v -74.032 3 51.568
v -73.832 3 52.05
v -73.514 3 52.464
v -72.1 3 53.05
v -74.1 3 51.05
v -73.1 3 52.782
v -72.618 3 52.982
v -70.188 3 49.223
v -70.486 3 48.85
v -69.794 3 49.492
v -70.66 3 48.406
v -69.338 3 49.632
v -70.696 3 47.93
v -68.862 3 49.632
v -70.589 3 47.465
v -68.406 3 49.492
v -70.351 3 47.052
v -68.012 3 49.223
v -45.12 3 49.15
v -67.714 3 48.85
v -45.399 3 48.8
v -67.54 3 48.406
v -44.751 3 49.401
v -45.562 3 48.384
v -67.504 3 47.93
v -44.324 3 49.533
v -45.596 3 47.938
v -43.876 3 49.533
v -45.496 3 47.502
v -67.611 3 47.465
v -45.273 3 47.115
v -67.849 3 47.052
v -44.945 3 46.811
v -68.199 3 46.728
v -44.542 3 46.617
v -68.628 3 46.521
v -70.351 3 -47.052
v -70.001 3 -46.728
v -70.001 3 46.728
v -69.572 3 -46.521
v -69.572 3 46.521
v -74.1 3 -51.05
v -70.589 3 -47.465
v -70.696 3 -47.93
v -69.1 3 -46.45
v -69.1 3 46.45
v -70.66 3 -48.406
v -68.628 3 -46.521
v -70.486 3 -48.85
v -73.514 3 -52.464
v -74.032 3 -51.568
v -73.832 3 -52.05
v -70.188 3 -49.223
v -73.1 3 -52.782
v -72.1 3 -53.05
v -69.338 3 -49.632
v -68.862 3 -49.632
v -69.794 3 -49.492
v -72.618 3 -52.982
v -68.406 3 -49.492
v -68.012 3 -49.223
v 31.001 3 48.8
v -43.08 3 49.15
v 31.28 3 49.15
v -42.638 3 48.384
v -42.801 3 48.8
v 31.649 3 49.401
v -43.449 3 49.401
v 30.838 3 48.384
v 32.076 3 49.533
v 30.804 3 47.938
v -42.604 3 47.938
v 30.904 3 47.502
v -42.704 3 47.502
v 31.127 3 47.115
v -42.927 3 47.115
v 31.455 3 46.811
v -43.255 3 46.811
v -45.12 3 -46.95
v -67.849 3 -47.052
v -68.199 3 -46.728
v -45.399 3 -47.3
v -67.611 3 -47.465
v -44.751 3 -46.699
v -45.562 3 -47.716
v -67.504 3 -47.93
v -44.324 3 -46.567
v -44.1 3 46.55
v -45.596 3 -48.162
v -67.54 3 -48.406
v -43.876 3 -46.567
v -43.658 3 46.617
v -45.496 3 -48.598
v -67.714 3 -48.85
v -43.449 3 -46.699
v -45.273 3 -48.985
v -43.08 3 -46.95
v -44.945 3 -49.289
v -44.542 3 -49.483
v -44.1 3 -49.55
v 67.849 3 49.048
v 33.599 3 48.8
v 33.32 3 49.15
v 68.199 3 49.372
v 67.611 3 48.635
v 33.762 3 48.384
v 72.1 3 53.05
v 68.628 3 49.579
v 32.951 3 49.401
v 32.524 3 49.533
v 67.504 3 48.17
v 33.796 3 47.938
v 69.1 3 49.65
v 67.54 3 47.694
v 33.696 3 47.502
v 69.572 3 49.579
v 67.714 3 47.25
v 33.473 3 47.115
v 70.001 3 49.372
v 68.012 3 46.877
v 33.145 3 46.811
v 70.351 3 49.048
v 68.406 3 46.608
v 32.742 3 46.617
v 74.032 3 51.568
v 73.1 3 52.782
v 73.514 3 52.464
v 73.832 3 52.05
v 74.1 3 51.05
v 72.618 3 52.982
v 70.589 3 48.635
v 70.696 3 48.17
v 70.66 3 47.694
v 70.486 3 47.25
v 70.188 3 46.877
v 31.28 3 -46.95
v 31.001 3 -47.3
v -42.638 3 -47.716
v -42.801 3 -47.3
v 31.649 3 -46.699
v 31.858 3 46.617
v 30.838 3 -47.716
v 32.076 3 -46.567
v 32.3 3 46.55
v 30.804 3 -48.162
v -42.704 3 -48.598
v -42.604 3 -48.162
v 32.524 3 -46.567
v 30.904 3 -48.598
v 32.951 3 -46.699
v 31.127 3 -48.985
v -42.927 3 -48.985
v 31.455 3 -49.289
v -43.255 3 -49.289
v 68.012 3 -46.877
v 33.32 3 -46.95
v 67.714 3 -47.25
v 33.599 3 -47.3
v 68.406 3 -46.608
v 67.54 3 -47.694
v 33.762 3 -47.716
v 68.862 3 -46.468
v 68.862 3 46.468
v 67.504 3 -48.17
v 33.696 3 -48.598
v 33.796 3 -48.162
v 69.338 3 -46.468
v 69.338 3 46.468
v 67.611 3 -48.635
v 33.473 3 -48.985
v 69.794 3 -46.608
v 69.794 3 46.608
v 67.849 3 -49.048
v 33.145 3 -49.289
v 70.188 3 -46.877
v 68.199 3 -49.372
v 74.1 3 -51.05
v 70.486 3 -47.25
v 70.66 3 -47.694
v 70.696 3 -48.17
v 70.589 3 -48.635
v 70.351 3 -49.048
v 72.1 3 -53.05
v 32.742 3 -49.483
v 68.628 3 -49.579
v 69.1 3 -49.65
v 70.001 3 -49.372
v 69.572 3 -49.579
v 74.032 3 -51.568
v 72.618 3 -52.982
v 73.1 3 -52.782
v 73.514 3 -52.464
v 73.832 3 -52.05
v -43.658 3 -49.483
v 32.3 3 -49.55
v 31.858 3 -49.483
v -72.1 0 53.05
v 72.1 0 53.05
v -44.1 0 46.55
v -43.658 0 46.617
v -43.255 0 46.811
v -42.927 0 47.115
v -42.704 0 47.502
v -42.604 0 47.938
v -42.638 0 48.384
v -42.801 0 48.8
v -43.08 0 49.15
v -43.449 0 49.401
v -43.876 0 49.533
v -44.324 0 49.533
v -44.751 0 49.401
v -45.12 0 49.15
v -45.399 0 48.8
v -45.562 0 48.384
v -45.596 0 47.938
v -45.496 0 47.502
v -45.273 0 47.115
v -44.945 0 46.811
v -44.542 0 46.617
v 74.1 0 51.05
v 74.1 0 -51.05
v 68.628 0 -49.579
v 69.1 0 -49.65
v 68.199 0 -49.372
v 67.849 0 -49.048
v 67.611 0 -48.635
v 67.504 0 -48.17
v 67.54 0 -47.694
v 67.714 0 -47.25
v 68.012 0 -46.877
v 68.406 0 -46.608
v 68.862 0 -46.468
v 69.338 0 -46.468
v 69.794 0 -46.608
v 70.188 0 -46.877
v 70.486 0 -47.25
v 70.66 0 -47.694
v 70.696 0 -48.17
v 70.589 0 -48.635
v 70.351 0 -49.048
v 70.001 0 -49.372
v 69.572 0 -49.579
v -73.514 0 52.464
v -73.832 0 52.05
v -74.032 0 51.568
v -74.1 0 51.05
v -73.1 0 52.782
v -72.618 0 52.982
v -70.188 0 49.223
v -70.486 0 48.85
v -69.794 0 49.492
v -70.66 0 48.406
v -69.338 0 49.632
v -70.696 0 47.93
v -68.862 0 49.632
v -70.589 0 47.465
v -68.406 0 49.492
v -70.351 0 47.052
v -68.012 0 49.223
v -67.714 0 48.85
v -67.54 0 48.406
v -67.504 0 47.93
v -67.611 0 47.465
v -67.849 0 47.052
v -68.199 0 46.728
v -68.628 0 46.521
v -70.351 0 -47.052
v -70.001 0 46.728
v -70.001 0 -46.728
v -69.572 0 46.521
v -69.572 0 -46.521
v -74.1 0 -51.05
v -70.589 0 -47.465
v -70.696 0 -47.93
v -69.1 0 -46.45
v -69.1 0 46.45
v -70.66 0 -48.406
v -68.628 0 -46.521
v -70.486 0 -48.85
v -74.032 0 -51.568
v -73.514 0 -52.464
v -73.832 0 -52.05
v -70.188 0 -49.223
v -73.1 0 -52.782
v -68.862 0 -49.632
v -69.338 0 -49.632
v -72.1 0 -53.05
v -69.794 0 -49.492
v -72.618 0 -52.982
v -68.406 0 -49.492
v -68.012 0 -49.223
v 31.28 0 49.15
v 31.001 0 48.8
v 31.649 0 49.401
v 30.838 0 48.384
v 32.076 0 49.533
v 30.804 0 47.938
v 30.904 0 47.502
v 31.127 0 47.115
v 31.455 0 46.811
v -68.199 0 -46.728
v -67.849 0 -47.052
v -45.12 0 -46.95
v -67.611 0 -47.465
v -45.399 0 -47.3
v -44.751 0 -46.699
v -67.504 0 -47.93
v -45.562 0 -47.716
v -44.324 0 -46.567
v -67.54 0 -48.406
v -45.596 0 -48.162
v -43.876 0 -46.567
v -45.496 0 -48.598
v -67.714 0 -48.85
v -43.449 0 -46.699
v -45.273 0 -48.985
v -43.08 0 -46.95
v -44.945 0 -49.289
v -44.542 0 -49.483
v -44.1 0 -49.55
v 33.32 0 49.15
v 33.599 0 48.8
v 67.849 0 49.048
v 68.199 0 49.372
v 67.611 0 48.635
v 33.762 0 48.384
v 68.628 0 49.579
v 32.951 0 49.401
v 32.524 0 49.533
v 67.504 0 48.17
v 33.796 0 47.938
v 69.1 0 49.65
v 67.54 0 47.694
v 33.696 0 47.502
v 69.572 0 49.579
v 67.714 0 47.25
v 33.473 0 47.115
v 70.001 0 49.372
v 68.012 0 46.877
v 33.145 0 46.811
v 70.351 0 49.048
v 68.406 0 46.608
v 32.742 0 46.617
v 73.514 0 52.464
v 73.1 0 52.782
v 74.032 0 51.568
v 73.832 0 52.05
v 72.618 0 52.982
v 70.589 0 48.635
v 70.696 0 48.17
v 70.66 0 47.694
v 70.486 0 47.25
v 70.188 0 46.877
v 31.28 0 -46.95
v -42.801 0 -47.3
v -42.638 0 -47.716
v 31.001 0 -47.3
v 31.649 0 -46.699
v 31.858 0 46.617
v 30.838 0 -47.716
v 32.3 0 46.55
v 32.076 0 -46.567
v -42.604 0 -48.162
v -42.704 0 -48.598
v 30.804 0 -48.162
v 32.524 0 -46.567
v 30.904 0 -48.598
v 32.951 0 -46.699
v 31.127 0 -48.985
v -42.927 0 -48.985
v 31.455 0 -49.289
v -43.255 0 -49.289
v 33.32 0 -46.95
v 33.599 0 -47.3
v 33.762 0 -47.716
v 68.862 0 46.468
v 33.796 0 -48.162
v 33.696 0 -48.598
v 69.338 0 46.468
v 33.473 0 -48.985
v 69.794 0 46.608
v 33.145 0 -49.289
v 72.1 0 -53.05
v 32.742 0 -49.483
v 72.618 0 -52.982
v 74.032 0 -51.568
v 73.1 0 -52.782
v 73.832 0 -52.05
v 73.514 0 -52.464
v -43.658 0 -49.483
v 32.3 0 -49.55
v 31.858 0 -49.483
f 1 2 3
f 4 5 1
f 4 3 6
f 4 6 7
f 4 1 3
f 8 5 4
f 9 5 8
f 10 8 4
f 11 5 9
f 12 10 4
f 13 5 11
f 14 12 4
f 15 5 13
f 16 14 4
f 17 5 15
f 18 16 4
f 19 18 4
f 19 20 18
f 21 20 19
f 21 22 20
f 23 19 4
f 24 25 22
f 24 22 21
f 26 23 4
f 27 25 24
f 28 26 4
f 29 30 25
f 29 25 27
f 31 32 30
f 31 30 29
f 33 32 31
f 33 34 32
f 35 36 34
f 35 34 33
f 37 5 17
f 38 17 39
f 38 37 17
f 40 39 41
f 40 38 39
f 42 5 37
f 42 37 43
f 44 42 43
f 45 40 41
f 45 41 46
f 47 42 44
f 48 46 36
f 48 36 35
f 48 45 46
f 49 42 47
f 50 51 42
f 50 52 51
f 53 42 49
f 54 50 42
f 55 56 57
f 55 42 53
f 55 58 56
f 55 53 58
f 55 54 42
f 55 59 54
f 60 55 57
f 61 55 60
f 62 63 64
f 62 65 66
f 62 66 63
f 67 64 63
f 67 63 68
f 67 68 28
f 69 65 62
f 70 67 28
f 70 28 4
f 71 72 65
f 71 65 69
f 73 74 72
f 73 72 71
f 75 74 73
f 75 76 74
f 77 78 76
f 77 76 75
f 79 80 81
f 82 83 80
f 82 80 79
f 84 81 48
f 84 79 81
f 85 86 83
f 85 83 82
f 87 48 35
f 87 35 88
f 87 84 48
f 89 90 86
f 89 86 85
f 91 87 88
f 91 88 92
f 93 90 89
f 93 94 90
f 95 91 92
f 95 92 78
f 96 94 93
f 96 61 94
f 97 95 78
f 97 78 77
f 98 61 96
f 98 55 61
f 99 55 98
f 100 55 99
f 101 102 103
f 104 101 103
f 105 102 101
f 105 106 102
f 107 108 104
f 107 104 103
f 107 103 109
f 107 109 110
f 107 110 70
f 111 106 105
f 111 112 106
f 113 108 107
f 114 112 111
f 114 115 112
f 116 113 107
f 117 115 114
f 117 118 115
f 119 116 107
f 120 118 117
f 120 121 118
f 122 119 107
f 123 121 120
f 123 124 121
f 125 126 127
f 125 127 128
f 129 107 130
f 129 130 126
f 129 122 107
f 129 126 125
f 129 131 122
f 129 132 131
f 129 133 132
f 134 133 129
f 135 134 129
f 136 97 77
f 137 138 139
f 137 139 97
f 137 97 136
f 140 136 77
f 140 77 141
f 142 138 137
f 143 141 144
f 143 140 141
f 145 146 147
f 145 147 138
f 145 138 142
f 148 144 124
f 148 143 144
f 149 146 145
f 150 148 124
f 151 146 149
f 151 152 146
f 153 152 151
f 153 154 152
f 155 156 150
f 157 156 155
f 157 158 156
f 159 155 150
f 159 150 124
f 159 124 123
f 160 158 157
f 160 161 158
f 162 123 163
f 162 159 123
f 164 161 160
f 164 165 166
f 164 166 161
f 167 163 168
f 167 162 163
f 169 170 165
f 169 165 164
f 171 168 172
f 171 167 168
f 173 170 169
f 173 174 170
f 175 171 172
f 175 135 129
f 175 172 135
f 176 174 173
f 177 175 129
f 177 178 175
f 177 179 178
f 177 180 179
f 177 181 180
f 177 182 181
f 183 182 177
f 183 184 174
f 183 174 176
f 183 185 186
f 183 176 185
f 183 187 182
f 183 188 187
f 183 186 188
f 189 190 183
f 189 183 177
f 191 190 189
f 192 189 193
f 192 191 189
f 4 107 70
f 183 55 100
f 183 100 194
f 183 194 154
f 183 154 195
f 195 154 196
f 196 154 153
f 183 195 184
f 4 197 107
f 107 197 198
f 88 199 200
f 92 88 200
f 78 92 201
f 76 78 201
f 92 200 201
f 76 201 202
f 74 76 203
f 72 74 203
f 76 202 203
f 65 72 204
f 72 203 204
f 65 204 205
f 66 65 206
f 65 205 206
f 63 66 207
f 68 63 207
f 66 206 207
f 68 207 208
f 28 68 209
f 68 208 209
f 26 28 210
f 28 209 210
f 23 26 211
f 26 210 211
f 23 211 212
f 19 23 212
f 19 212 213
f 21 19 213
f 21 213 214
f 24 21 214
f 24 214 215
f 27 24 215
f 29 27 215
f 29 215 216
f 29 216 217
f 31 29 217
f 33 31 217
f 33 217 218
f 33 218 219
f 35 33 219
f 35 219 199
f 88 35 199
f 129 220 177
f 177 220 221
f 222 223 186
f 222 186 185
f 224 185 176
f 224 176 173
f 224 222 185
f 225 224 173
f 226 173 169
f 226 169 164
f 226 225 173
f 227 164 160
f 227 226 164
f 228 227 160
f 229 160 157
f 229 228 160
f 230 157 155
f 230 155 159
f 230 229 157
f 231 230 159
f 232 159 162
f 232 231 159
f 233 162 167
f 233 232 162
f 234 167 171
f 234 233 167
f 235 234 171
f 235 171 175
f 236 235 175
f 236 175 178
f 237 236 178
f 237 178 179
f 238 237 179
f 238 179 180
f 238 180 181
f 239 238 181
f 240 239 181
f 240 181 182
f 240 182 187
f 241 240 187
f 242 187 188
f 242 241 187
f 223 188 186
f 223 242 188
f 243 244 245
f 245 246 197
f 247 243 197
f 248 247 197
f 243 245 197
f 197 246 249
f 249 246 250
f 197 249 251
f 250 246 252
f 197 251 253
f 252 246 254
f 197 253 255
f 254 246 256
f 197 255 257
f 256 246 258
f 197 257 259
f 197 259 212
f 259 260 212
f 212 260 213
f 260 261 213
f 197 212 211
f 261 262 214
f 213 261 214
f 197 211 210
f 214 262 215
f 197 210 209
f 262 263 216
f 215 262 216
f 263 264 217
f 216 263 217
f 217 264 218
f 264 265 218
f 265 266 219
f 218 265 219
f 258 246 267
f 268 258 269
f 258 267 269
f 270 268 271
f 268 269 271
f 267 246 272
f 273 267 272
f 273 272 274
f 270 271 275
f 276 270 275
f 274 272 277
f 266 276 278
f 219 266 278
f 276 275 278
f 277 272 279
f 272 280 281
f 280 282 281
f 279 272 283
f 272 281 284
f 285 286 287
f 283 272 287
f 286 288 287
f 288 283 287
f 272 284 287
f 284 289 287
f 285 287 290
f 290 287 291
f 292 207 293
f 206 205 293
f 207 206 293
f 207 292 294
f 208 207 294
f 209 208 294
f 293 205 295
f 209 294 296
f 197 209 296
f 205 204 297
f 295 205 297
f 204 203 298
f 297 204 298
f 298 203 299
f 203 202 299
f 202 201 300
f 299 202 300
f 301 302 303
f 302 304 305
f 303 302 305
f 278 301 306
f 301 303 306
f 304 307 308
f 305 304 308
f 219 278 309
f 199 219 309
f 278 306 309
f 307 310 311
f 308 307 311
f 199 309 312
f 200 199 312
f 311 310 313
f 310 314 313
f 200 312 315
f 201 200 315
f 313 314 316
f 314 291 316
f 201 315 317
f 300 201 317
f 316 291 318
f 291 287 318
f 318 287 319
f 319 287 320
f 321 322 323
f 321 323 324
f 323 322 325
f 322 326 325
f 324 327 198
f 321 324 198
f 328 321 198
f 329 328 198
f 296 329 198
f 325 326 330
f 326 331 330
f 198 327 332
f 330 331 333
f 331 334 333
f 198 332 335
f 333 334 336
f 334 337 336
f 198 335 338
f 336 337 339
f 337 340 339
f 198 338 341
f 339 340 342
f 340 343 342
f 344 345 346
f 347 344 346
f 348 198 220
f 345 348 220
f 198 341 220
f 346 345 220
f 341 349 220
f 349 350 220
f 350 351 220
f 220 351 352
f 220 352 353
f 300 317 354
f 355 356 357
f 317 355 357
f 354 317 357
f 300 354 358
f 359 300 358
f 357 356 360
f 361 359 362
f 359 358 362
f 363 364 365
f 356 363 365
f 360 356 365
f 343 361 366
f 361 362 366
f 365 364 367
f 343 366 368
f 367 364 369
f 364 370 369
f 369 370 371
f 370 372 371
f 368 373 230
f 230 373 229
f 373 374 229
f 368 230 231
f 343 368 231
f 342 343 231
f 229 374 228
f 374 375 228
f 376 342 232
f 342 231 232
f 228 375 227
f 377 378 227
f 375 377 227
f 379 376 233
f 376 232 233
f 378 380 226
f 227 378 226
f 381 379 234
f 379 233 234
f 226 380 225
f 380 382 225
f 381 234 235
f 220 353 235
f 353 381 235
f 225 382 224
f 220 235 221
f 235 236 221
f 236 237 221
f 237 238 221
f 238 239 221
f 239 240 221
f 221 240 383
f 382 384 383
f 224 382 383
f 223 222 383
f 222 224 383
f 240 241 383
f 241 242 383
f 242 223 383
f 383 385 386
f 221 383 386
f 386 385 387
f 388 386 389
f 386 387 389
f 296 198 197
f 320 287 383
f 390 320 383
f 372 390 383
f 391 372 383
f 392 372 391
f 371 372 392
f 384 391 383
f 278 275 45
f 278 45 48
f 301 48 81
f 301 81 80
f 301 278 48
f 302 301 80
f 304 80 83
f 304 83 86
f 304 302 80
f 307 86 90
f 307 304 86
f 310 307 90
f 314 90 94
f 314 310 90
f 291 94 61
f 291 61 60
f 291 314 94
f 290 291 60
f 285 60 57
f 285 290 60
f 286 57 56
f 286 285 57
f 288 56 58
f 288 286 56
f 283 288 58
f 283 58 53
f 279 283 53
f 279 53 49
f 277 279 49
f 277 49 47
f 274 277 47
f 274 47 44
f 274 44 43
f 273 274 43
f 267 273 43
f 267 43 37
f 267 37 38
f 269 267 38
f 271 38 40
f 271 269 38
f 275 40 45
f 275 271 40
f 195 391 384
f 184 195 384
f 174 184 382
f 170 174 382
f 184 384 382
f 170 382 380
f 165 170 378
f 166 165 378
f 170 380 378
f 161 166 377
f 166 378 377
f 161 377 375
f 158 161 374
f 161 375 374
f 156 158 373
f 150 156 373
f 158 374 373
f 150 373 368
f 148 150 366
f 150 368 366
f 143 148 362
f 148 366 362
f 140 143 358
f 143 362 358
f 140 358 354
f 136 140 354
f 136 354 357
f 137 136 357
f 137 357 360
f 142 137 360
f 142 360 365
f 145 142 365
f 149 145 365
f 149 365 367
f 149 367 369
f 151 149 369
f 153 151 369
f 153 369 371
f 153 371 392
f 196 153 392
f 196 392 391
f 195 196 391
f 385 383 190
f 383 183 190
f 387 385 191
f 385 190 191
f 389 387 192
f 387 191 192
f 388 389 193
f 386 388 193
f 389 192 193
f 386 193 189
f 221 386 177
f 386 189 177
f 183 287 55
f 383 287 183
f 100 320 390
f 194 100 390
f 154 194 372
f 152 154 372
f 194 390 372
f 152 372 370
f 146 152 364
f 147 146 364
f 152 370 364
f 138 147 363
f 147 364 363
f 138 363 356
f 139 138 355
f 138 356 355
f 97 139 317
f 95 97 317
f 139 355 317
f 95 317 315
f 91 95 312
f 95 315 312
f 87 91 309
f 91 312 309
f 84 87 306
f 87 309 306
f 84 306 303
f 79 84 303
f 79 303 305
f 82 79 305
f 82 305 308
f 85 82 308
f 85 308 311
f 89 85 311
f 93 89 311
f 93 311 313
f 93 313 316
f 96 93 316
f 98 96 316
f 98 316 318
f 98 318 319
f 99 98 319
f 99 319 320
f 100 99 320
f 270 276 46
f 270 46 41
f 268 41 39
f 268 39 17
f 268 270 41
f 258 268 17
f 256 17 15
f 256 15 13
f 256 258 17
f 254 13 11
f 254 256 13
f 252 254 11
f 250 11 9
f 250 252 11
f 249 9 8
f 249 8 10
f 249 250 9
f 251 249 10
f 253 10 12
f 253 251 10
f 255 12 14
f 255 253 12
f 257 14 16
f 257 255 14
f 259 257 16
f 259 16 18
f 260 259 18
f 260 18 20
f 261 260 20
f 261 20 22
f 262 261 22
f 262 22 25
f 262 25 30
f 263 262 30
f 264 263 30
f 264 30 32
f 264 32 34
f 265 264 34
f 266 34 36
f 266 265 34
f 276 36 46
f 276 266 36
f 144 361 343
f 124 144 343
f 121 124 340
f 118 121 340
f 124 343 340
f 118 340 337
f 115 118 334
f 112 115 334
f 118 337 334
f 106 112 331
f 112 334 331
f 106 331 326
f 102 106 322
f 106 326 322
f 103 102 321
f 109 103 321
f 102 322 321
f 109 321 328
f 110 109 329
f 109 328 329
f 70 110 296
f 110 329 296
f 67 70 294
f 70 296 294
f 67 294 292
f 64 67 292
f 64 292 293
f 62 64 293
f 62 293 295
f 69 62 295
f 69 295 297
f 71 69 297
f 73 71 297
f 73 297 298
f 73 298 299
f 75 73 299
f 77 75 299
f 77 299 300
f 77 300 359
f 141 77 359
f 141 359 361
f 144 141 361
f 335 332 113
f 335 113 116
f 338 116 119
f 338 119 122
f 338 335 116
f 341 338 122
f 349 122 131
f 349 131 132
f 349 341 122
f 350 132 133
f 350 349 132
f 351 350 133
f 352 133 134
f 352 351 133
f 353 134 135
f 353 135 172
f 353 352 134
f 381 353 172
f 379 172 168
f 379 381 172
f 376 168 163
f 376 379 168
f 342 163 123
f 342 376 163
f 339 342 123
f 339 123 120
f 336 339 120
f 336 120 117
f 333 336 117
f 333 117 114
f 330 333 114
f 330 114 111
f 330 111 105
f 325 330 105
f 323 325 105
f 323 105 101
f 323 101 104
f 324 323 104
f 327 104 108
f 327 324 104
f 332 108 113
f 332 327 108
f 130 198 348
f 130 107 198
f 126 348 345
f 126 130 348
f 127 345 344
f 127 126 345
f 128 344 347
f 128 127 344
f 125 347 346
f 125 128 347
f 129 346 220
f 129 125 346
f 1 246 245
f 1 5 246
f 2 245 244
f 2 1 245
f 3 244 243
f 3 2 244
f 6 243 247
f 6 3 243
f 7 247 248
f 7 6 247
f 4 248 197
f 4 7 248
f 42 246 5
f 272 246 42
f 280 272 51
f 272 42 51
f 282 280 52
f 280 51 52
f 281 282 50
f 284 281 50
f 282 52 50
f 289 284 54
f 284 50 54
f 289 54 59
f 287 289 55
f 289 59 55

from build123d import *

# Parameters (mm, degrees)
SKETCH1_W           = 148.2
SKETCH1_H           = 106.1
SKETCH1_R           = 1.6
BOSS_EXTRUDE1_DEPTH = 3
FILLET1_R           = 2
CUT_EXTRUDE1_REACH  = 93.182
SKETCH3_R           = 1.5


with BuildPart() as part:
    # Sketch1 → Boss-Extrude1 (new body)
    with BuildSketch(Plane(origin=(0, 0, 0), x_dir=(1, 0, 0), z_dir=(0, 1, 0))):
        Rectangle(SKETCH1_W, SKETCH1_H)
        with Locations(Location((-69.1, 48.05, 0), (0, 0, 270))):
            Circle(SKETCH1_R, mode=Mode.SUBTRACT)
        with Locations(Location((-69.1, -48.05, 0), (0, 0, 90))):
            Circle(SKETCH1_R, mode=Mode.SUBTRACT)
        with Locations(Location((69.1, -48.05, 0), (0, 0, 270))):
            Circle(SKETCH1_R, mode=Mode.SUBTRACT)
        with Locations(Location((69.1, 48.05, 0), (0, 0, 90))):
            Circle(SKETCH1_R, mode=Mode.SUBTRACT)
    extrude(amount=BOSS_EXTRUDE1_DEPTH)

    # Fillet1
    fillet1_edges = [part.edges().sort_by_distance(p)[0] for p in [
        (-74.1, 1.5, -53.05),
        (74.1, 1.5, -53.05),
        (74.1, 1.5, 53.05),
        (-74.1, 1.5, 53.05),
    ]]
    fillet(fillet1_edges, radius=FILLET1_R)

    # Sketch3 → Cut-Extrude1 (cut, up to next)
    with BuildSketch(Plane.XZ, mode=Mode.PRIVATE) as cut_extrude1_sk1:
        with Locations(Location((32.3, 48.05, 0), (0, 0, 270))):
            Circle(SKETCH3_R)
    cut_extrude1_tool1 = extrude(cut_extrude1_sk1.sketch, amount=-CUT_EXTRUDE1_REACH, mode=Mode.PRIVATE) & part.part
    # Sketch3 → Cut-Extrude1 (cut, up to next)
    with BuildSketch(Plane.XZ, mode=Mode.PRIVATE) as cut_extrude1_sk2:
        with Locations(Location((-44.1, 48.05, 0), (0, 0, 270))):
            Circle(SKETCH3_R)
    cut_extrude1_tool2 = extrude(cut_extrude1_sk2.sketch, amount=-CUT_EXTRUDE1_REACH, mode=Mode.PRIVATE) & part.part
    # Sketch3 → Cut-Extrude1 (cut, up to next)
    with BuildSketch(Plane.XZ, mode=Mode.PRIVATE) as cut_extrude1_sk3:
        with Locations(Location((-44.1, -48.05, 0), (0, 0, 270))):
            Circle(SKETCH3_R)
    cut_extrude1_tool3 = extrude(cut_extrude1_sk3.sketch, amount=-CUT_EXTRUDE1_REACH, mode=Mode.PRIVATE) & part.part
    # Sketch3 → Cut-Extrude1 (cut, up to next)
    with BuildSketch(Plane.XZ, mode=Mode.PRIVATE) as cut_extrude1_sk4:
        with Locations(Location((32.3, -48.05, 0), (0, 0, 270))):
            Circle(SKETCH3_R)
    cut_extrude1_tool4 = extrude(cut_extrude1_sk4.sketch, amount=-CUT_EXTRUDE1_REACH, mode=Mode.PRIVATE) & part.part
    add(cut_extrude1_tool1.solids().sort_by_distance((32.3, 0, 48.05))[0], mode=Mode.SUBTRACT)
    add(cut_extrude1_tool2.solids().sort_by_distance((-44.1, 0, 48.05))[0], mode=Mode.SUBTRACT)
    add(cut_extrude1_tool3.solids().sort_by_distance((-44.1, 0, -48.05))[0], mode=Mode.SUBTRACT)
    add(cut_extrude1_tool4.solids().sort_by_distance((32.3, 0, -48.05))[0], mode=Mode.SUBTRACT)


solid = part.part
